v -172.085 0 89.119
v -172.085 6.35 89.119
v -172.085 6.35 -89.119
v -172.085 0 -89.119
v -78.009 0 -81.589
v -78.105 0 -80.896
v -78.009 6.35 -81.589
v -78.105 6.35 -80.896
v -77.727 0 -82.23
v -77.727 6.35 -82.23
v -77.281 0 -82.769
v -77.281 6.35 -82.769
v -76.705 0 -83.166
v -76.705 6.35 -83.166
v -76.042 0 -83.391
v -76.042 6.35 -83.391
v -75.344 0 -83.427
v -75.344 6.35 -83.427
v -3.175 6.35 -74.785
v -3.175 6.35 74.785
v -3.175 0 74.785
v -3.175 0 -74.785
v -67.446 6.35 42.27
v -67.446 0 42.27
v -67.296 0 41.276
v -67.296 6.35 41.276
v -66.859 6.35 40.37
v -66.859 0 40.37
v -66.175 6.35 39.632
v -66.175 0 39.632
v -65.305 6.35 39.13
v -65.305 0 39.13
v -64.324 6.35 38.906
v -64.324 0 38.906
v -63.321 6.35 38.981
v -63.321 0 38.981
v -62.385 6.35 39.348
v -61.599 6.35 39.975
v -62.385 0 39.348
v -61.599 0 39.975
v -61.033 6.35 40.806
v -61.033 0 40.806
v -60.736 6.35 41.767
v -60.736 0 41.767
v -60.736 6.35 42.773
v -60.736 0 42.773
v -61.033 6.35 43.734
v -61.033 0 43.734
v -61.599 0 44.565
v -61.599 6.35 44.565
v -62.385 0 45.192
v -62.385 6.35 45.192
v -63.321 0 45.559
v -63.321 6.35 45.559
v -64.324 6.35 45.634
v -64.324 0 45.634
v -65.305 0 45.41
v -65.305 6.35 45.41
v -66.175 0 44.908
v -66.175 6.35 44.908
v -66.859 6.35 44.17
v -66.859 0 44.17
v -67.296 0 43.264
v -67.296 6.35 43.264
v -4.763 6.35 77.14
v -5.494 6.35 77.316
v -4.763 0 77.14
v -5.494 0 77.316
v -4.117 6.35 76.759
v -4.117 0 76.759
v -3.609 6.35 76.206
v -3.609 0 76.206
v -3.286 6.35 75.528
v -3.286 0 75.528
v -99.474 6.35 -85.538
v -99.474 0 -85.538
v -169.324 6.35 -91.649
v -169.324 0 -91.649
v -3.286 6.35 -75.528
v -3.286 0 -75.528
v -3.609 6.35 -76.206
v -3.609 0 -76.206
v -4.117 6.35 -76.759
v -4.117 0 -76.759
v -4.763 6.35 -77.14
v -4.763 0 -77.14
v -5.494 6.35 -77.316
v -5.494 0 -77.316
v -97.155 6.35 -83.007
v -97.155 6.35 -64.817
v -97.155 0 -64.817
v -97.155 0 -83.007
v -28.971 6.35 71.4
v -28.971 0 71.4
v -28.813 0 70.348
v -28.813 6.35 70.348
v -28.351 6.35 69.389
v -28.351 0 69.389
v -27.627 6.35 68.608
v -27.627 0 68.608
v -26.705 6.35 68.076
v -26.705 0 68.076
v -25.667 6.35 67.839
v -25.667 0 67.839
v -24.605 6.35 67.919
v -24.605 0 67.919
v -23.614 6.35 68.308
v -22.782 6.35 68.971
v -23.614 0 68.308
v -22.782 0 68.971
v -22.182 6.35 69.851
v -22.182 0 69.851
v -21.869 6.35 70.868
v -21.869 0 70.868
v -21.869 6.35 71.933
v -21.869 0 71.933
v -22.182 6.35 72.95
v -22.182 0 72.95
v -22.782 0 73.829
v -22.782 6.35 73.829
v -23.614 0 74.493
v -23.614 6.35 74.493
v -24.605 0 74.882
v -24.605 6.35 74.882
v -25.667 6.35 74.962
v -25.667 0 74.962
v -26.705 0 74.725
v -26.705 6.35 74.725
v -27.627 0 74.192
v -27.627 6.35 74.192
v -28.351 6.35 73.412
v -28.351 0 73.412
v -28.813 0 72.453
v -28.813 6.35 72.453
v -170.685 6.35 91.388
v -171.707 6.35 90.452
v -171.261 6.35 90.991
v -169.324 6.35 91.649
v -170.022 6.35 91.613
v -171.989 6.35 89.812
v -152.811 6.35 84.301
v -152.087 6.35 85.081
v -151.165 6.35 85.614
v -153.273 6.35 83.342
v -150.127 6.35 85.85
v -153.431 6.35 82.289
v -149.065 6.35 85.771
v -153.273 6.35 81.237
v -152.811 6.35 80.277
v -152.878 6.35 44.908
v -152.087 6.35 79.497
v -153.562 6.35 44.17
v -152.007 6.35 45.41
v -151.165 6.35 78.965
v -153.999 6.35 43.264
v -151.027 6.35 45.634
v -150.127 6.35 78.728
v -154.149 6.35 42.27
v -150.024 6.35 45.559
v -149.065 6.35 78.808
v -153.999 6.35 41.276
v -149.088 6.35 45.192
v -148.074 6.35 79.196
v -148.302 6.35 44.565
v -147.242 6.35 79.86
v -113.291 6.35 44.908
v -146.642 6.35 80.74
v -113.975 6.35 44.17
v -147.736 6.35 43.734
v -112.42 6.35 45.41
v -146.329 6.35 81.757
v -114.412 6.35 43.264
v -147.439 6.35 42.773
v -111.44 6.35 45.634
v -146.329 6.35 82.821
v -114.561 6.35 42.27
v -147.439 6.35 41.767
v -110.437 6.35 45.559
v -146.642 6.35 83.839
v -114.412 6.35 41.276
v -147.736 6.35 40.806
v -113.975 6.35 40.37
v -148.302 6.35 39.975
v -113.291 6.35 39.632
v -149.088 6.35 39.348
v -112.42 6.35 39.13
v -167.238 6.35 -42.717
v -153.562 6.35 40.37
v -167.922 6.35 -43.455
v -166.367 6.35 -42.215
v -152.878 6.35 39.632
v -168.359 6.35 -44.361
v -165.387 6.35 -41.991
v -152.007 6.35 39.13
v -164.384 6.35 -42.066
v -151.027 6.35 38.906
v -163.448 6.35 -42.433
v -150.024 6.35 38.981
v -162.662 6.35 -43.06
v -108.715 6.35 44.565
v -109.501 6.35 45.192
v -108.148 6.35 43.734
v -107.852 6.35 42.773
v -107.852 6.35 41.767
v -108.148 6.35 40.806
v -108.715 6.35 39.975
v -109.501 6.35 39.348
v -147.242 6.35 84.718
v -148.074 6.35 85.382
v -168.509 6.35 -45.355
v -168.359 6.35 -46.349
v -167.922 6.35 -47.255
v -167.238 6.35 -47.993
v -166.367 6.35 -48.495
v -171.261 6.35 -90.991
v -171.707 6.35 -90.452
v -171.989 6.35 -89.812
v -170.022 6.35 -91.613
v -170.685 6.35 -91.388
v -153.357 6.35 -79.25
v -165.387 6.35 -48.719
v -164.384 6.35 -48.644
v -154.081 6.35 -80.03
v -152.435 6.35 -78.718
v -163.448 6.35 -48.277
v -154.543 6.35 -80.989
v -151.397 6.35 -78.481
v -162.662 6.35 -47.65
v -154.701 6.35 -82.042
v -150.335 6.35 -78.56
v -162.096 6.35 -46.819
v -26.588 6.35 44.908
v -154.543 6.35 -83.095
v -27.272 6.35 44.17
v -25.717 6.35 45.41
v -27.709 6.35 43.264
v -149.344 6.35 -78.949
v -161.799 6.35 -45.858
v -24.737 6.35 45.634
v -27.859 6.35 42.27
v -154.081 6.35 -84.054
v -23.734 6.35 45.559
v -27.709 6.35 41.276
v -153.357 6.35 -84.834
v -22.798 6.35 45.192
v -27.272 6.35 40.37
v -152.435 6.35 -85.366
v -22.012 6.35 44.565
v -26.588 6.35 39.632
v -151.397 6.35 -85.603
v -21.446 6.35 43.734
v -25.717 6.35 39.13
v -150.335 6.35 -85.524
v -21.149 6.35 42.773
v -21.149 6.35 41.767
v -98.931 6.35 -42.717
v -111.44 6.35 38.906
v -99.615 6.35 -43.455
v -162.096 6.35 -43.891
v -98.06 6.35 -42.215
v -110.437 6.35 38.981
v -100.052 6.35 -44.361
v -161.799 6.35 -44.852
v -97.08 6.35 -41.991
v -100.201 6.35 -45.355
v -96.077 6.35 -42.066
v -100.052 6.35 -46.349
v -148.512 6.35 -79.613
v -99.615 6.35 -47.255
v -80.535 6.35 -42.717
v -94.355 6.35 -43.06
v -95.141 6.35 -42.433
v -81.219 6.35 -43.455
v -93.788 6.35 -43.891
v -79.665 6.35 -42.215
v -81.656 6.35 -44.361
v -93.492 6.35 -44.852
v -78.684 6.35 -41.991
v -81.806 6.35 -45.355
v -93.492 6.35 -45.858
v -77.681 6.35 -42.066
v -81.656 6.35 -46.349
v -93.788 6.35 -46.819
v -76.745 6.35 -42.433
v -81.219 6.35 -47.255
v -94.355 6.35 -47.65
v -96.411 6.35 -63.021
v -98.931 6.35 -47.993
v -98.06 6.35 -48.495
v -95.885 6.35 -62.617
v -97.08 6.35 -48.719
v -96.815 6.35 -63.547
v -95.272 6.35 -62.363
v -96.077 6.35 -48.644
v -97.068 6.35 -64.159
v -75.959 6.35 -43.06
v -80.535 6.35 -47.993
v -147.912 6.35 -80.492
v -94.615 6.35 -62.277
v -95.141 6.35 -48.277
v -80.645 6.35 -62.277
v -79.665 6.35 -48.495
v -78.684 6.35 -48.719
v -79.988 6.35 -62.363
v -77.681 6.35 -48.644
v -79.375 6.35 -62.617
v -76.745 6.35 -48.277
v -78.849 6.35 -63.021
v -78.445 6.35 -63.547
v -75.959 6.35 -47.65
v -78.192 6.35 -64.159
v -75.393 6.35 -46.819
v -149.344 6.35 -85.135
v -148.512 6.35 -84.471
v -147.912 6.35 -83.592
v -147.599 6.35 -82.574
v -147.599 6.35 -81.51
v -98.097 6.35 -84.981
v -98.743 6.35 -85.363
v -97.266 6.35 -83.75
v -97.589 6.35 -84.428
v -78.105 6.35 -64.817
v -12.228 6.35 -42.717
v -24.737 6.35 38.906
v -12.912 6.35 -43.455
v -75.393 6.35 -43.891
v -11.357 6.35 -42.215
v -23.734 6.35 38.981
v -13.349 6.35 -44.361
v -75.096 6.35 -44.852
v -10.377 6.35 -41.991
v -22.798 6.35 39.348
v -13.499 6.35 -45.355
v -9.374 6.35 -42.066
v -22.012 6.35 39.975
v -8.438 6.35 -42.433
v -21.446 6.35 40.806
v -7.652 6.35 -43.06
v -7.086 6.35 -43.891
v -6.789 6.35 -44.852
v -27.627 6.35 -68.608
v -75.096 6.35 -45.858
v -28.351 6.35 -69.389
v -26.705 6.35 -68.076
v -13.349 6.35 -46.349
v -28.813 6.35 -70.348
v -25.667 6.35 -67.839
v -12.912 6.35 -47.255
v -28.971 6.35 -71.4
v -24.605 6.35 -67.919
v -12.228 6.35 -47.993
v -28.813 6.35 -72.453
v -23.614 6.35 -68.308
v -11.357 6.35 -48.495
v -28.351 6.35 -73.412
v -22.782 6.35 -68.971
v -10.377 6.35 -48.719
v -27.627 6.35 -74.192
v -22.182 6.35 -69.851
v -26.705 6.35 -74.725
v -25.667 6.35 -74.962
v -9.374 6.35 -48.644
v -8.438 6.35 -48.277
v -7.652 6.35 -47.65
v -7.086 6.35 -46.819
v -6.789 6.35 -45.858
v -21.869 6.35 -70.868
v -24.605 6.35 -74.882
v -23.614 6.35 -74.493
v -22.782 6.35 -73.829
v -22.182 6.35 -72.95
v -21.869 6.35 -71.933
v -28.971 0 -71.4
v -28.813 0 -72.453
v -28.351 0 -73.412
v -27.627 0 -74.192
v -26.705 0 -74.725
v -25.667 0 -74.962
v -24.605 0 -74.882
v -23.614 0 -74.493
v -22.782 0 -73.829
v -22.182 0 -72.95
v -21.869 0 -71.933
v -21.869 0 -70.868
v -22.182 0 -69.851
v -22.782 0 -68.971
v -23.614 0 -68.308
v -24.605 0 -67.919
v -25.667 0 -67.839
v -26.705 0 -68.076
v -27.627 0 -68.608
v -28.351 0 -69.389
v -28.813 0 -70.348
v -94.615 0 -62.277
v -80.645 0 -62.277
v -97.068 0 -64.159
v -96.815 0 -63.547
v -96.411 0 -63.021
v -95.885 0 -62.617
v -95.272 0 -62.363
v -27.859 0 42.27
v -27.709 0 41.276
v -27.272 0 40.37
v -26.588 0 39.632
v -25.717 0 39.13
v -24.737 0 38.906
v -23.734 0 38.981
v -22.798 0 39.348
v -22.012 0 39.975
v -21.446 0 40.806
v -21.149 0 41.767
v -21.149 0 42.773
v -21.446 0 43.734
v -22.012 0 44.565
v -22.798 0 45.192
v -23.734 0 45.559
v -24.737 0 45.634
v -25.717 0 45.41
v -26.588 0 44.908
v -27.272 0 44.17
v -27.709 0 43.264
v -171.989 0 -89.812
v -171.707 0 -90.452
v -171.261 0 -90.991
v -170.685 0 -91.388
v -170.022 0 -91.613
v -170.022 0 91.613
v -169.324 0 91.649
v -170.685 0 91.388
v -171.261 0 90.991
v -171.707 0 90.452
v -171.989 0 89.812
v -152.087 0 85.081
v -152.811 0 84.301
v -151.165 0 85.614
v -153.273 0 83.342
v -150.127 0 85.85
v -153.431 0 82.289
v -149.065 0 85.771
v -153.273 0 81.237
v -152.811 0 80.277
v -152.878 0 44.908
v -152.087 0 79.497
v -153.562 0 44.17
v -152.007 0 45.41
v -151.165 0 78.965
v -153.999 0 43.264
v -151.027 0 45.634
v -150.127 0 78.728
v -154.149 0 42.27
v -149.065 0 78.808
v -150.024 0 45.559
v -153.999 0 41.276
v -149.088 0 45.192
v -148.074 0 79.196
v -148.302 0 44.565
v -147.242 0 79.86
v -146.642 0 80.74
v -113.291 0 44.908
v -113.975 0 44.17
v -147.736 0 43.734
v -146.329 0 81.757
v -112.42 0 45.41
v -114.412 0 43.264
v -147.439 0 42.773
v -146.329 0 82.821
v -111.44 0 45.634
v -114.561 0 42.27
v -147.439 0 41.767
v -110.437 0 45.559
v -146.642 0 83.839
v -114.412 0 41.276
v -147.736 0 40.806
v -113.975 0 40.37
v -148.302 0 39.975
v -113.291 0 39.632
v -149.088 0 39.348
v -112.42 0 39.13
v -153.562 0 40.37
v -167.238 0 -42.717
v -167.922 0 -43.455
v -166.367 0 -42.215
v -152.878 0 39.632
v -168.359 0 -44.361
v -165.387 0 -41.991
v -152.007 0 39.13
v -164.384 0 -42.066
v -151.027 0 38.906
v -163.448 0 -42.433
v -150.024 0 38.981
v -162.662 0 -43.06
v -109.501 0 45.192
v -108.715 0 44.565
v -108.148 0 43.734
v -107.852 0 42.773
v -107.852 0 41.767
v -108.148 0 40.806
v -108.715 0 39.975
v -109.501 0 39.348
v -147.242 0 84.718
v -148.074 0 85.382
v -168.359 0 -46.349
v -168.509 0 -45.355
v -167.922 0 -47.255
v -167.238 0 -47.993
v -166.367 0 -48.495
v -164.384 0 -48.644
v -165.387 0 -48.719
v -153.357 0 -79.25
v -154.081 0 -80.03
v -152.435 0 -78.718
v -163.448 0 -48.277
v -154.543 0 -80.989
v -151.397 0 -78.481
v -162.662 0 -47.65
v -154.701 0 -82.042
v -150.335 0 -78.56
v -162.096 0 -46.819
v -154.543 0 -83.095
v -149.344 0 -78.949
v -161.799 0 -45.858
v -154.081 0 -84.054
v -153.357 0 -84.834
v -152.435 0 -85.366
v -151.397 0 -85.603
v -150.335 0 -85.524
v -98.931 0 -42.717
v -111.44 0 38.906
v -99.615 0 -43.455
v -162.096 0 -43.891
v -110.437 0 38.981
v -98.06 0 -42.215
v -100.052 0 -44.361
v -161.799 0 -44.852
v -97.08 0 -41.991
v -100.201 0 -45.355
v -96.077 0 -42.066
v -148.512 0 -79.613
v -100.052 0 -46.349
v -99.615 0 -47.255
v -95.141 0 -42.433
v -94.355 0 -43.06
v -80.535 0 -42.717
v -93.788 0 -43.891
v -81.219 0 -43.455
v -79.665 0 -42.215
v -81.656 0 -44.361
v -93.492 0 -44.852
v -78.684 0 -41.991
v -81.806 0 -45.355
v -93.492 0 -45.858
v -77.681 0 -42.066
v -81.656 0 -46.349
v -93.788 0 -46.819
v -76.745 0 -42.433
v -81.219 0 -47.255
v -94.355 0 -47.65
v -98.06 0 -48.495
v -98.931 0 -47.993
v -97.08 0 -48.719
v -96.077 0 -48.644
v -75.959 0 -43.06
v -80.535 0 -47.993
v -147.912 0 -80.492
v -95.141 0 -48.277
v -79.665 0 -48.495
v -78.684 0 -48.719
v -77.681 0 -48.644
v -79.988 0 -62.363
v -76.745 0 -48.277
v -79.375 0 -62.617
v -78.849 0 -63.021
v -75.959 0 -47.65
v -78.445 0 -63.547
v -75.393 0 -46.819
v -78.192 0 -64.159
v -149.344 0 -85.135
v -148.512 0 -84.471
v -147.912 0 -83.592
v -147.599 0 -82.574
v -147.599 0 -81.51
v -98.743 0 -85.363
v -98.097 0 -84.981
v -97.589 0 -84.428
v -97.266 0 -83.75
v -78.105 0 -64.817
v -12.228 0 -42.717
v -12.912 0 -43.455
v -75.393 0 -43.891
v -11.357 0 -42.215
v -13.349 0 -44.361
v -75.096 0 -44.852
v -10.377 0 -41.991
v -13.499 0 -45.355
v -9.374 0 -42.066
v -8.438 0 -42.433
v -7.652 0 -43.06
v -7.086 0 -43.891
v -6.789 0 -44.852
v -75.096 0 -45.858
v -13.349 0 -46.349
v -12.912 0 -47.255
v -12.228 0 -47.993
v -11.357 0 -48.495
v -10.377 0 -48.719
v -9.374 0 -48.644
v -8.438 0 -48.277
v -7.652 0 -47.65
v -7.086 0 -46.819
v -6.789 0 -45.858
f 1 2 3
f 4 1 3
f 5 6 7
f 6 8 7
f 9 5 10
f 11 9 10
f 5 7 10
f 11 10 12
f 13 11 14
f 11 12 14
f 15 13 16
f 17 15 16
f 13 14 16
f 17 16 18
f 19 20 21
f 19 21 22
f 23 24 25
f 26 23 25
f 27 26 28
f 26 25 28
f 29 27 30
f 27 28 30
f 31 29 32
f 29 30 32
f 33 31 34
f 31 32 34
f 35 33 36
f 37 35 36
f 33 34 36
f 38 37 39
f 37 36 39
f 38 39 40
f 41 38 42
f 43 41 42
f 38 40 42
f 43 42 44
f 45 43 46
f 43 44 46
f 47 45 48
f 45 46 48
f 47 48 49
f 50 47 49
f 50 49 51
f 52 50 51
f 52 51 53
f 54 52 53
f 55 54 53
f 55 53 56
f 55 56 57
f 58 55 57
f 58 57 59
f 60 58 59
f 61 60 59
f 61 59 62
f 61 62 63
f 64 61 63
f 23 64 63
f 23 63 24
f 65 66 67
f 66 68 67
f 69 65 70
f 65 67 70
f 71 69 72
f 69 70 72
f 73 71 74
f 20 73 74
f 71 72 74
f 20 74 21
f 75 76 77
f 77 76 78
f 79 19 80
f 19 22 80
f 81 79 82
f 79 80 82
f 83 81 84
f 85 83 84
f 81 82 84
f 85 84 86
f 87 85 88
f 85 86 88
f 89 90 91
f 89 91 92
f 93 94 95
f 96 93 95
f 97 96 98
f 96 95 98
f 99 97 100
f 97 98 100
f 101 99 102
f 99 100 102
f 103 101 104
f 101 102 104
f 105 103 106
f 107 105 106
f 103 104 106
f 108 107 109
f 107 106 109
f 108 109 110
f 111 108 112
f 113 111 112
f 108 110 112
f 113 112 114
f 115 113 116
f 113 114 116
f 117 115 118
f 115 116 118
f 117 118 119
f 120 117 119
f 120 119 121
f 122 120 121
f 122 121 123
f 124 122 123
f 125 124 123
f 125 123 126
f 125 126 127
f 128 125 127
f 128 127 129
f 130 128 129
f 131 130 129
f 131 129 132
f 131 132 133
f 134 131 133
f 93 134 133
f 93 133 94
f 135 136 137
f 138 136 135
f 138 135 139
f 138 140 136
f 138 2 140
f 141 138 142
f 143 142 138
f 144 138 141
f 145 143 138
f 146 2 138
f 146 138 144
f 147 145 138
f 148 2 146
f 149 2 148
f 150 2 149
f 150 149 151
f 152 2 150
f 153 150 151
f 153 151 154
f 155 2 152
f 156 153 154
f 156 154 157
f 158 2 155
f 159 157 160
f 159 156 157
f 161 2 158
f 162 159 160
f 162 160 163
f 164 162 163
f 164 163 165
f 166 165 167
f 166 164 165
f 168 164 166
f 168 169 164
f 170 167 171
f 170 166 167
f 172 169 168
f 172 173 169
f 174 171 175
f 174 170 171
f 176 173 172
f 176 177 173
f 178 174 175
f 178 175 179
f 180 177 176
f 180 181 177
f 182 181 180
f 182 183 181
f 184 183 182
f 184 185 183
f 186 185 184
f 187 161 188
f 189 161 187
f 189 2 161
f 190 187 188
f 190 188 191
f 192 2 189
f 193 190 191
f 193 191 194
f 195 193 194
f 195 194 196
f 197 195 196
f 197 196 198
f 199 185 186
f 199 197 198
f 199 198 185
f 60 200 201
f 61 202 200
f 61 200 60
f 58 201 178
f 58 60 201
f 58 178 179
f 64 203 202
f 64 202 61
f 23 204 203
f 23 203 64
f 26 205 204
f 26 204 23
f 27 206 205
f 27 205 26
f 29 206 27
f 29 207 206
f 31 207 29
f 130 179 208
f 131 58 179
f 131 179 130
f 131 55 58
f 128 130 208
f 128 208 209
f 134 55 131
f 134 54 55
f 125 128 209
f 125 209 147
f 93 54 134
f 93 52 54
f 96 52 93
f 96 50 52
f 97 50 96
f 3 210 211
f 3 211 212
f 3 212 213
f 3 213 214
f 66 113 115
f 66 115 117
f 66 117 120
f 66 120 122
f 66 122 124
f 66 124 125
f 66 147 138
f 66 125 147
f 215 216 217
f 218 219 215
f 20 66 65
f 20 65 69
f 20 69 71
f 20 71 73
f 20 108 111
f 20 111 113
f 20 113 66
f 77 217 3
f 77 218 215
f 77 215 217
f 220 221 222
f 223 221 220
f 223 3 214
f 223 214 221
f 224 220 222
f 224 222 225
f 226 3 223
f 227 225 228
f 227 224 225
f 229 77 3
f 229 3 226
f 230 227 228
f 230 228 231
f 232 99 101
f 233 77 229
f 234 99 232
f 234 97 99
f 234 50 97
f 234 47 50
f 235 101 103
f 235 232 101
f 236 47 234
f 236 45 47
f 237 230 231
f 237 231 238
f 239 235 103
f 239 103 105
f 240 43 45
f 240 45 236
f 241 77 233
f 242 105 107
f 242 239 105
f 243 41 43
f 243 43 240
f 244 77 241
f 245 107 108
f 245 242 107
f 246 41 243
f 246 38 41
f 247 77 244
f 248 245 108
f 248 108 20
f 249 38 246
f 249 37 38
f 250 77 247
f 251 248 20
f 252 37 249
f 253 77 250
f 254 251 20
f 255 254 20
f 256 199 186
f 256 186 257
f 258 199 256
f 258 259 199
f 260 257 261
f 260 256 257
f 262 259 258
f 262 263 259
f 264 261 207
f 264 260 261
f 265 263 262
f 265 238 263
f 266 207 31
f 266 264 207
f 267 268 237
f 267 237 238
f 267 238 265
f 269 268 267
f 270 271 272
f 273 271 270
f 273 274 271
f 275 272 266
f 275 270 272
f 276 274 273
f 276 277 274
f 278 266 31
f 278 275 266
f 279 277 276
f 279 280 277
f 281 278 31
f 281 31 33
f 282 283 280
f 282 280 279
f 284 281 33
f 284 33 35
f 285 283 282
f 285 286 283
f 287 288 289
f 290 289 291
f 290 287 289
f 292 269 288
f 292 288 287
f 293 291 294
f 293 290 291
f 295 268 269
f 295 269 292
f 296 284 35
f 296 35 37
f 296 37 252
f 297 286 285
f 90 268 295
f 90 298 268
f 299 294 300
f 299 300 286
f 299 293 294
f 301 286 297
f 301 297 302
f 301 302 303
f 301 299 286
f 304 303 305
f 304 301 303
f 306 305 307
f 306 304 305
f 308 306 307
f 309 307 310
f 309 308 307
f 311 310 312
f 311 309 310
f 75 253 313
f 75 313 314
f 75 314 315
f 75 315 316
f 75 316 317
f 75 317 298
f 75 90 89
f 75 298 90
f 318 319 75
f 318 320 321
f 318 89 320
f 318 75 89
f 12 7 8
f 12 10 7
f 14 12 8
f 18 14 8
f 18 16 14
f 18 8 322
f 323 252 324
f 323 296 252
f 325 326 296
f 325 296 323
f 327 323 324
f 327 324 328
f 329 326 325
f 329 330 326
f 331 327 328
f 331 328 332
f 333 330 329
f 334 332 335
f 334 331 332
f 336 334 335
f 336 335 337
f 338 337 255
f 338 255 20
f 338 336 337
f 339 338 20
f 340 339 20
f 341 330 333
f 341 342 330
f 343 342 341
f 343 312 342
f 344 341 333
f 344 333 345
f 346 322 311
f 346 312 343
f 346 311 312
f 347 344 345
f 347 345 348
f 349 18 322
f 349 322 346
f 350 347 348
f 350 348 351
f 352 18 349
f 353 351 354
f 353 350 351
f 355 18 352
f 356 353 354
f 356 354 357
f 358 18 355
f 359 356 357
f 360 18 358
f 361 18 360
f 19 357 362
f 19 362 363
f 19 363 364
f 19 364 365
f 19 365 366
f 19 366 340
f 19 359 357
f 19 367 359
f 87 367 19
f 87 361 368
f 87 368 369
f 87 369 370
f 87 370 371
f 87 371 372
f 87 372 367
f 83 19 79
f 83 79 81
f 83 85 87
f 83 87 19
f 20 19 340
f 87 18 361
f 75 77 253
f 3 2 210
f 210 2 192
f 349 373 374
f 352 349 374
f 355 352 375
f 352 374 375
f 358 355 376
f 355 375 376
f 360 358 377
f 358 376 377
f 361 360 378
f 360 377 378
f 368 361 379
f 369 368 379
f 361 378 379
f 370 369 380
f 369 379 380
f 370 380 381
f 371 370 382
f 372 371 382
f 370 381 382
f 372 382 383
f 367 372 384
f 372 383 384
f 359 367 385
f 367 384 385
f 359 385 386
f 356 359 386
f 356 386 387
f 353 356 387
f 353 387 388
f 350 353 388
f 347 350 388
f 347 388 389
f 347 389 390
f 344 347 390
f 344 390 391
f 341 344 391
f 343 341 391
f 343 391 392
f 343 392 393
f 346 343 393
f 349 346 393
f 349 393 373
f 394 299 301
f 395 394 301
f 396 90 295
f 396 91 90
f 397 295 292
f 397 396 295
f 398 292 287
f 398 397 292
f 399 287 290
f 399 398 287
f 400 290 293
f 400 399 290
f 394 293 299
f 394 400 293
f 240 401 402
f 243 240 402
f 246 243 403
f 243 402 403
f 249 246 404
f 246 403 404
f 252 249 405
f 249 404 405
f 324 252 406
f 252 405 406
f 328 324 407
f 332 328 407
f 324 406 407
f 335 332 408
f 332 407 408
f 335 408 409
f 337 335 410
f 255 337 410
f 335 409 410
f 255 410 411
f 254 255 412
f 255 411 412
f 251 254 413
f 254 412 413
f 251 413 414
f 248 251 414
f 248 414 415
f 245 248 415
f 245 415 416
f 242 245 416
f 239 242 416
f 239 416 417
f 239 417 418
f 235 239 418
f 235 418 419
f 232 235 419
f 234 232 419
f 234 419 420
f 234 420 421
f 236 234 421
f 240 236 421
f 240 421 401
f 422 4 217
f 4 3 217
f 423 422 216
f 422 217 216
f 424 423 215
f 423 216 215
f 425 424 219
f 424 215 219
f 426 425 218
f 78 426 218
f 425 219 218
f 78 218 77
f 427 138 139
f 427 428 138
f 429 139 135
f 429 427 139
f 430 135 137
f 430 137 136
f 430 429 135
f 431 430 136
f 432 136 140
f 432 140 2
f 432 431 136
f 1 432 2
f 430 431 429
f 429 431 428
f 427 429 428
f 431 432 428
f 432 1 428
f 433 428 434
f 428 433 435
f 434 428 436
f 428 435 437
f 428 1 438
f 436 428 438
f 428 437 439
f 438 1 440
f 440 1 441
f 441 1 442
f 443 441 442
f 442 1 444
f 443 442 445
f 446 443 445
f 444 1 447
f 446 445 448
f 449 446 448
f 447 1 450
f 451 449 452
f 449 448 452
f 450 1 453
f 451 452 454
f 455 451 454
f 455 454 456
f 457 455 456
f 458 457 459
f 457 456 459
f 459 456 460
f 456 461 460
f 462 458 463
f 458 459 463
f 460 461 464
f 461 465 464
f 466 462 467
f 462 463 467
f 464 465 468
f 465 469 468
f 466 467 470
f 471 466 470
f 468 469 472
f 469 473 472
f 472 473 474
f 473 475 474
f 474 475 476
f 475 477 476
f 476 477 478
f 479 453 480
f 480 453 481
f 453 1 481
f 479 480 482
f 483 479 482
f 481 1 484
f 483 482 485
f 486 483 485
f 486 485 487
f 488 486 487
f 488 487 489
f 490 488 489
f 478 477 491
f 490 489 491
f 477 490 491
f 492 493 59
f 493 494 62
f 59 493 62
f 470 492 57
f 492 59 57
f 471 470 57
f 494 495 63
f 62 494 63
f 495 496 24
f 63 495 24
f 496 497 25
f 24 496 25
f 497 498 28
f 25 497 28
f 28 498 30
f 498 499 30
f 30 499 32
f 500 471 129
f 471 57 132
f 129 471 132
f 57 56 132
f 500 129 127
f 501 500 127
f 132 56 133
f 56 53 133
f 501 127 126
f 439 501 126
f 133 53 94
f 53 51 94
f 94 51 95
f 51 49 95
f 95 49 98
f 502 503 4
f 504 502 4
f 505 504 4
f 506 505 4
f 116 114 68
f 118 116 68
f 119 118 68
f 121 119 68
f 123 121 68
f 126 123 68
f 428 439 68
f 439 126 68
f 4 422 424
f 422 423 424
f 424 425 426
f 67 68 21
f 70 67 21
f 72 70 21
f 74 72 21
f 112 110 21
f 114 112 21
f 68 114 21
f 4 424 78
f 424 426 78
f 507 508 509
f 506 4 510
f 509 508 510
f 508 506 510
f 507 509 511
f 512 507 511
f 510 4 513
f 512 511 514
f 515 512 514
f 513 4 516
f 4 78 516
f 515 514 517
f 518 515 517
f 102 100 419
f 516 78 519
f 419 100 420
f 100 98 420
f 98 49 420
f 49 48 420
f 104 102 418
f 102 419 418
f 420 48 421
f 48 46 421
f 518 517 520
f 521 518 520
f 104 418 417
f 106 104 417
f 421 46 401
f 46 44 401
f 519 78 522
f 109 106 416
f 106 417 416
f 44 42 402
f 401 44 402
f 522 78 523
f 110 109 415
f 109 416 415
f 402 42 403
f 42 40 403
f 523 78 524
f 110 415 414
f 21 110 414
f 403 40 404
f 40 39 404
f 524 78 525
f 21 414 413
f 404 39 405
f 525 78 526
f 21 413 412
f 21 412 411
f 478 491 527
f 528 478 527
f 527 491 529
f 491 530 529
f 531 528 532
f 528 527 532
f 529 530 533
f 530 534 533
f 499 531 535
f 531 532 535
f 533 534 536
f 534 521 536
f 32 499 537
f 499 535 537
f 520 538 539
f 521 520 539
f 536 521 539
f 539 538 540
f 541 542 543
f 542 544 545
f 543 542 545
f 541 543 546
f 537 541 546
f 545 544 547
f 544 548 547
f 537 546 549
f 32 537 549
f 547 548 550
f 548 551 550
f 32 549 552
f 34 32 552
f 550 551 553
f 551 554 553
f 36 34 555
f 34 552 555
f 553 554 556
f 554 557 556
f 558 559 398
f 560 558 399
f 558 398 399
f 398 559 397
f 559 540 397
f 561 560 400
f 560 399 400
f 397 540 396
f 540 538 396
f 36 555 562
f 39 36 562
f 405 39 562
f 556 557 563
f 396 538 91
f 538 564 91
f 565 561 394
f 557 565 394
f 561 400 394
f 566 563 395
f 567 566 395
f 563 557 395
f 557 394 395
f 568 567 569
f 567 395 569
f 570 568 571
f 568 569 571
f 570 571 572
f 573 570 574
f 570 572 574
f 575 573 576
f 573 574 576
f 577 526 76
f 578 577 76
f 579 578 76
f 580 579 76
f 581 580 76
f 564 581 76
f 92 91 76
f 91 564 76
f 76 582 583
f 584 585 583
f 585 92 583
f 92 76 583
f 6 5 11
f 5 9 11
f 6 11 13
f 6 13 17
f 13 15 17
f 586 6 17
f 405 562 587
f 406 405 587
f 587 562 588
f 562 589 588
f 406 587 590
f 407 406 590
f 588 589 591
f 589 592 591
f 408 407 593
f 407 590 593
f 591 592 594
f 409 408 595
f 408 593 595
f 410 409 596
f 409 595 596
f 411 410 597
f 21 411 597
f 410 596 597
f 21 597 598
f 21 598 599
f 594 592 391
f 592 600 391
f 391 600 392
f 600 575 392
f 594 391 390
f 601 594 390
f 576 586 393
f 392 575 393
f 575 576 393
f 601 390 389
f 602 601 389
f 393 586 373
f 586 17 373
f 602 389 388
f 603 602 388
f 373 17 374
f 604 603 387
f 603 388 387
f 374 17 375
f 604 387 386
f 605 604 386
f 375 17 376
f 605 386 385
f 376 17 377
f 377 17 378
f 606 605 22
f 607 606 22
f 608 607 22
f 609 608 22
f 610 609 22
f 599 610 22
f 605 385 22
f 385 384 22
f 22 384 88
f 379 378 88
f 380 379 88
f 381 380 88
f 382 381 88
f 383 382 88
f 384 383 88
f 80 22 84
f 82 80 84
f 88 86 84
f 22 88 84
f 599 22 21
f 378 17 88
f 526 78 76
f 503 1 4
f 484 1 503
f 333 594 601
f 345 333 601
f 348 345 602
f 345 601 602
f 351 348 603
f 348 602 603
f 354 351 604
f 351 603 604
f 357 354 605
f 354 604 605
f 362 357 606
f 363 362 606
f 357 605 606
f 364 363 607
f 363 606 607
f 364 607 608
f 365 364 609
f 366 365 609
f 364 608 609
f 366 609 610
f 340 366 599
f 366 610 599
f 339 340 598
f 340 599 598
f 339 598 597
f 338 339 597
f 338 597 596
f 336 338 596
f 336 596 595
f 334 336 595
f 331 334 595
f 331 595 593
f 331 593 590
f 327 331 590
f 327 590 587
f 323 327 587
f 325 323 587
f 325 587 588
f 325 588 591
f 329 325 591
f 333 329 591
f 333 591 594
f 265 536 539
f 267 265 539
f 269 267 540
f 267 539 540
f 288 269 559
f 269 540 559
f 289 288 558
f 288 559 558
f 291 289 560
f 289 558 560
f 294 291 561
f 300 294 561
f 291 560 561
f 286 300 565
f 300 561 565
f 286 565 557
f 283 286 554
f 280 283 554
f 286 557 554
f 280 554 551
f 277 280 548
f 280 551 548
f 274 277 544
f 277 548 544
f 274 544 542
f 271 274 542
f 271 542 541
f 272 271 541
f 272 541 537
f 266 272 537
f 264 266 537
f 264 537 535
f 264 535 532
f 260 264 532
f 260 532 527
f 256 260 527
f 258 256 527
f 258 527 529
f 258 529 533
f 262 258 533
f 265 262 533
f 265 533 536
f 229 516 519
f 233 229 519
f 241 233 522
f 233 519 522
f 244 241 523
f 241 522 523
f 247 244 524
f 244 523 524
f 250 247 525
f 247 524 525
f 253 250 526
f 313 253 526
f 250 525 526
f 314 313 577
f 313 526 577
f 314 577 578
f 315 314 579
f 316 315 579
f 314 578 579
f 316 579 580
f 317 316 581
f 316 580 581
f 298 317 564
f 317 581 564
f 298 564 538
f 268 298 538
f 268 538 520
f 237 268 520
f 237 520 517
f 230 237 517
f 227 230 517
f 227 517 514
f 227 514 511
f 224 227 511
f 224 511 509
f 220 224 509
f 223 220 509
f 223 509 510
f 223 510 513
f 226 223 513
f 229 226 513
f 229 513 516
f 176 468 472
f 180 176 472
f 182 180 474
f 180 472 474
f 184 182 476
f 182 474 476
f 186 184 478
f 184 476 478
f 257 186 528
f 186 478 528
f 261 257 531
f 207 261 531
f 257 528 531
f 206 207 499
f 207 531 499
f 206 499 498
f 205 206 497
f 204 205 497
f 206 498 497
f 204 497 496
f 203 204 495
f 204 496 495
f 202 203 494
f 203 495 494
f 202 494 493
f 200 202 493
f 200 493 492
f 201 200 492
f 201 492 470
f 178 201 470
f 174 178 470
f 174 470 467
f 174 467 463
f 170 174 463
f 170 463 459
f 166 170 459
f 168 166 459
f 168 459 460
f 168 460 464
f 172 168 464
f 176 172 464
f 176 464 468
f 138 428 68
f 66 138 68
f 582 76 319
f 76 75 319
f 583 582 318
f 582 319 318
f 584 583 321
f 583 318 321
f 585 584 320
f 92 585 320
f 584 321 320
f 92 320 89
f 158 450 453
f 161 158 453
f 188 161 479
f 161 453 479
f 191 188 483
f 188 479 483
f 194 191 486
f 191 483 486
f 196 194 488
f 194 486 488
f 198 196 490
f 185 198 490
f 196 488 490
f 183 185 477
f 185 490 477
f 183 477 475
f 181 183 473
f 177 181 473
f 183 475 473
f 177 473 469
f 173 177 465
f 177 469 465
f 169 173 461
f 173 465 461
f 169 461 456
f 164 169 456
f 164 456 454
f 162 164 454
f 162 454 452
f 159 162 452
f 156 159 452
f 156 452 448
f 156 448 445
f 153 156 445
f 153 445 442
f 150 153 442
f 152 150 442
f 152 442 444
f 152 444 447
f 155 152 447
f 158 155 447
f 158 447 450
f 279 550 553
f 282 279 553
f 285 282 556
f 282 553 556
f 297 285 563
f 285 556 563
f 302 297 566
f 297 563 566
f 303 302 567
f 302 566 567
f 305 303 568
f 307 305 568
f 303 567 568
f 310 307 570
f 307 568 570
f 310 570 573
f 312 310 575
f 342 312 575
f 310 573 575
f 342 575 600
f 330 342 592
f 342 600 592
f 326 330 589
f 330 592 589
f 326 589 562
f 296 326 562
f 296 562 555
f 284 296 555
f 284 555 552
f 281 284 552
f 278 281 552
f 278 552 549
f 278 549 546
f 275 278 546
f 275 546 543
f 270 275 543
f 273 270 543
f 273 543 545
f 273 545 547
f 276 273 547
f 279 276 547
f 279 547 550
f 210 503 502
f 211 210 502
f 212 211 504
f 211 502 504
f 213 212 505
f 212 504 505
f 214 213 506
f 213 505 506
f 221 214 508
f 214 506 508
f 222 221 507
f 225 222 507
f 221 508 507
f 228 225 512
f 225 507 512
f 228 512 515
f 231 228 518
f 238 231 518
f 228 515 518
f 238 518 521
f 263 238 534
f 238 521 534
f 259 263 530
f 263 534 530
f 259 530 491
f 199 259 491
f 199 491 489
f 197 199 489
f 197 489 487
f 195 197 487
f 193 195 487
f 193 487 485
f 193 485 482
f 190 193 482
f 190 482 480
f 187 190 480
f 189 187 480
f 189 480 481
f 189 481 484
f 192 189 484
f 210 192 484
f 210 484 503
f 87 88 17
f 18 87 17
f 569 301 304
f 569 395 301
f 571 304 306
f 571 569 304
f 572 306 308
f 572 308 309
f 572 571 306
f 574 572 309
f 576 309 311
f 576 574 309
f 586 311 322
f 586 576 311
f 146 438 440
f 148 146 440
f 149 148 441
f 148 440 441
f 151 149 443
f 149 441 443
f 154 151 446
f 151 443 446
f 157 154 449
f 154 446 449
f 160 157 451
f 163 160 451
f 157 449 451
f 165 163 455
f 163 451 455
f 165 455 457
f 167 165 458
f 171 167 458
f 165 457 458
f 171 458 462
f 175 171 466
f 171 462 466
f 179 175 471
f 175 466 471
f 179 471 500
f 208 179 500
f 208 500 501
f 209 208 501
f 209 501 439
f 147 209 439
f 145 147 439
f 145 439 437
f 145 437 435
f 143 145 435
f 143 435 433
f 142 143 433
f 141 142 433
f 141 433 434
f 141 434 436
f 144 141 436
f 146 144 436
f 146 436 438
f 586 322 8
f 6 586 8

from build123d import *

# Parameters (mm, degrees)
BOSS_EXTRUDE1_DEPTH              = 6.35
SKETCH2_W                        = 19.05
SKETCH2_H                        = 44.45
CUT_EXTRUDE1_DEPTH               = 199.119607398
F_17_64_0_26563_DIAMETER_HOLE1_D = 6.747002
F_1_4_CLEARANCE_HOLE1_D          = 7.14248
SKETCH7_W                        = 3.175
SKETCH7_H                        = 184.33652634
SKETCH7_H_2                      = 154.225553014
CUT_EXTRUDE2_DEPTH               = 199.119607398
FILLET1_R                        = 2.54


with BuildPart() as part:
    # Sketch1 → Boss-Extrude1 (new body)
    with BuildSketch(Plane(origin=(0, 0, 0), x_dir=(1, 0, 0), z_dir=(0, 1, 0))):
        Polygon((0, -76.835), (0, 76.835), (-175.26, 92.16826317), (-175.26, -92.16826317), align=None)
    extrude(amount=BOSS_EXTRUDE1_DEPTH)

    # Sketch2 → Cut-Extrude1 (cut, through all)
    with BuildSketch(Plane(origin=(0, 6.35, 0), x_dir=(1, 0, 0), z_dir=(0, 1, 0))):
        with Locations((-87.63, 84.501631585)):
            Rectangle(SKETCH2_W, SKETCH2_H)
    extrude(amount=-CUT_EXTRUDE1_DEPTH, mode=Mode.SUBTRACT)

    # 17/64 (0.26563) Diameter Hole1 (through all)
    with Locations(Plane(origin=(0, 6.35, 0), x_dir=(1, 0, 0), z_dir=(0, 1, 0))):
        with Locations((-24.485, -42.27), (-64.0721, -42.27), (-111.1879, -42.27), (-150.775, -42.27), (-78.4321, 45.355), (-10.125, 45.355), (-96.8279, 45.355), (-165.135, 45.355)):
            Hole(F_17_64_0_26563_DIAMETER_HOLE1_D / 2)

    # 1/4 Clearance Hole1 (through all)
    with Locations(Plane(origin=(0, 6.35, 0), x_dir=(1, 0, 0), z_dir=(0, 1, 0))):
        with Locations((-25.4, 71.400370648), (-25.4, -71.400370648), (-149.86, -82.28920971), (-151.13, 82.042)):
            Hole(F_1_4_CLEARANCE_HOLE1_D / 2)

    # Sketch7 → Cut-Extrude2 (cut, through all)
    with BuildSketch(Plane(origin=(0, 6.35, 0), x_dir=(1, 0, 0), z_dir=(0, 1, 0))):
        with Locations((-173.6725, 0)):
            Rectangle(SKETCH7_W, SKETCH7_H)
        with Locations((-1.5875, 0)):
            Rectangle(SKETCH7_W, SKETCH7_H_2)
    extrude(amount=-CUT_EXTRUDE2_DEPTH, mode=Mode.SUBTRACT)

    # Fillet1
    fillet1_edges = [part.edges().sort_by_distance(p)[0] for p in [
        (-172.085, 3.175, -91.890486663),
        (-172.085, 3.175, 91.890486663),
        (-3.175, 3.175, 77.112776507),
        (-3.175, 3.175, -77.112776507),
        (-97.155, 3.175, -85.334961105),
        (-97.155, 3.175, -62.276631585),
        (-78.105, 3.175, -83.668302065),
        (-78.105, 3.175, -62.276631585),
    ]]
    fillet(fillet1_edges, radius=FILLET1_R)


solid = part.part
